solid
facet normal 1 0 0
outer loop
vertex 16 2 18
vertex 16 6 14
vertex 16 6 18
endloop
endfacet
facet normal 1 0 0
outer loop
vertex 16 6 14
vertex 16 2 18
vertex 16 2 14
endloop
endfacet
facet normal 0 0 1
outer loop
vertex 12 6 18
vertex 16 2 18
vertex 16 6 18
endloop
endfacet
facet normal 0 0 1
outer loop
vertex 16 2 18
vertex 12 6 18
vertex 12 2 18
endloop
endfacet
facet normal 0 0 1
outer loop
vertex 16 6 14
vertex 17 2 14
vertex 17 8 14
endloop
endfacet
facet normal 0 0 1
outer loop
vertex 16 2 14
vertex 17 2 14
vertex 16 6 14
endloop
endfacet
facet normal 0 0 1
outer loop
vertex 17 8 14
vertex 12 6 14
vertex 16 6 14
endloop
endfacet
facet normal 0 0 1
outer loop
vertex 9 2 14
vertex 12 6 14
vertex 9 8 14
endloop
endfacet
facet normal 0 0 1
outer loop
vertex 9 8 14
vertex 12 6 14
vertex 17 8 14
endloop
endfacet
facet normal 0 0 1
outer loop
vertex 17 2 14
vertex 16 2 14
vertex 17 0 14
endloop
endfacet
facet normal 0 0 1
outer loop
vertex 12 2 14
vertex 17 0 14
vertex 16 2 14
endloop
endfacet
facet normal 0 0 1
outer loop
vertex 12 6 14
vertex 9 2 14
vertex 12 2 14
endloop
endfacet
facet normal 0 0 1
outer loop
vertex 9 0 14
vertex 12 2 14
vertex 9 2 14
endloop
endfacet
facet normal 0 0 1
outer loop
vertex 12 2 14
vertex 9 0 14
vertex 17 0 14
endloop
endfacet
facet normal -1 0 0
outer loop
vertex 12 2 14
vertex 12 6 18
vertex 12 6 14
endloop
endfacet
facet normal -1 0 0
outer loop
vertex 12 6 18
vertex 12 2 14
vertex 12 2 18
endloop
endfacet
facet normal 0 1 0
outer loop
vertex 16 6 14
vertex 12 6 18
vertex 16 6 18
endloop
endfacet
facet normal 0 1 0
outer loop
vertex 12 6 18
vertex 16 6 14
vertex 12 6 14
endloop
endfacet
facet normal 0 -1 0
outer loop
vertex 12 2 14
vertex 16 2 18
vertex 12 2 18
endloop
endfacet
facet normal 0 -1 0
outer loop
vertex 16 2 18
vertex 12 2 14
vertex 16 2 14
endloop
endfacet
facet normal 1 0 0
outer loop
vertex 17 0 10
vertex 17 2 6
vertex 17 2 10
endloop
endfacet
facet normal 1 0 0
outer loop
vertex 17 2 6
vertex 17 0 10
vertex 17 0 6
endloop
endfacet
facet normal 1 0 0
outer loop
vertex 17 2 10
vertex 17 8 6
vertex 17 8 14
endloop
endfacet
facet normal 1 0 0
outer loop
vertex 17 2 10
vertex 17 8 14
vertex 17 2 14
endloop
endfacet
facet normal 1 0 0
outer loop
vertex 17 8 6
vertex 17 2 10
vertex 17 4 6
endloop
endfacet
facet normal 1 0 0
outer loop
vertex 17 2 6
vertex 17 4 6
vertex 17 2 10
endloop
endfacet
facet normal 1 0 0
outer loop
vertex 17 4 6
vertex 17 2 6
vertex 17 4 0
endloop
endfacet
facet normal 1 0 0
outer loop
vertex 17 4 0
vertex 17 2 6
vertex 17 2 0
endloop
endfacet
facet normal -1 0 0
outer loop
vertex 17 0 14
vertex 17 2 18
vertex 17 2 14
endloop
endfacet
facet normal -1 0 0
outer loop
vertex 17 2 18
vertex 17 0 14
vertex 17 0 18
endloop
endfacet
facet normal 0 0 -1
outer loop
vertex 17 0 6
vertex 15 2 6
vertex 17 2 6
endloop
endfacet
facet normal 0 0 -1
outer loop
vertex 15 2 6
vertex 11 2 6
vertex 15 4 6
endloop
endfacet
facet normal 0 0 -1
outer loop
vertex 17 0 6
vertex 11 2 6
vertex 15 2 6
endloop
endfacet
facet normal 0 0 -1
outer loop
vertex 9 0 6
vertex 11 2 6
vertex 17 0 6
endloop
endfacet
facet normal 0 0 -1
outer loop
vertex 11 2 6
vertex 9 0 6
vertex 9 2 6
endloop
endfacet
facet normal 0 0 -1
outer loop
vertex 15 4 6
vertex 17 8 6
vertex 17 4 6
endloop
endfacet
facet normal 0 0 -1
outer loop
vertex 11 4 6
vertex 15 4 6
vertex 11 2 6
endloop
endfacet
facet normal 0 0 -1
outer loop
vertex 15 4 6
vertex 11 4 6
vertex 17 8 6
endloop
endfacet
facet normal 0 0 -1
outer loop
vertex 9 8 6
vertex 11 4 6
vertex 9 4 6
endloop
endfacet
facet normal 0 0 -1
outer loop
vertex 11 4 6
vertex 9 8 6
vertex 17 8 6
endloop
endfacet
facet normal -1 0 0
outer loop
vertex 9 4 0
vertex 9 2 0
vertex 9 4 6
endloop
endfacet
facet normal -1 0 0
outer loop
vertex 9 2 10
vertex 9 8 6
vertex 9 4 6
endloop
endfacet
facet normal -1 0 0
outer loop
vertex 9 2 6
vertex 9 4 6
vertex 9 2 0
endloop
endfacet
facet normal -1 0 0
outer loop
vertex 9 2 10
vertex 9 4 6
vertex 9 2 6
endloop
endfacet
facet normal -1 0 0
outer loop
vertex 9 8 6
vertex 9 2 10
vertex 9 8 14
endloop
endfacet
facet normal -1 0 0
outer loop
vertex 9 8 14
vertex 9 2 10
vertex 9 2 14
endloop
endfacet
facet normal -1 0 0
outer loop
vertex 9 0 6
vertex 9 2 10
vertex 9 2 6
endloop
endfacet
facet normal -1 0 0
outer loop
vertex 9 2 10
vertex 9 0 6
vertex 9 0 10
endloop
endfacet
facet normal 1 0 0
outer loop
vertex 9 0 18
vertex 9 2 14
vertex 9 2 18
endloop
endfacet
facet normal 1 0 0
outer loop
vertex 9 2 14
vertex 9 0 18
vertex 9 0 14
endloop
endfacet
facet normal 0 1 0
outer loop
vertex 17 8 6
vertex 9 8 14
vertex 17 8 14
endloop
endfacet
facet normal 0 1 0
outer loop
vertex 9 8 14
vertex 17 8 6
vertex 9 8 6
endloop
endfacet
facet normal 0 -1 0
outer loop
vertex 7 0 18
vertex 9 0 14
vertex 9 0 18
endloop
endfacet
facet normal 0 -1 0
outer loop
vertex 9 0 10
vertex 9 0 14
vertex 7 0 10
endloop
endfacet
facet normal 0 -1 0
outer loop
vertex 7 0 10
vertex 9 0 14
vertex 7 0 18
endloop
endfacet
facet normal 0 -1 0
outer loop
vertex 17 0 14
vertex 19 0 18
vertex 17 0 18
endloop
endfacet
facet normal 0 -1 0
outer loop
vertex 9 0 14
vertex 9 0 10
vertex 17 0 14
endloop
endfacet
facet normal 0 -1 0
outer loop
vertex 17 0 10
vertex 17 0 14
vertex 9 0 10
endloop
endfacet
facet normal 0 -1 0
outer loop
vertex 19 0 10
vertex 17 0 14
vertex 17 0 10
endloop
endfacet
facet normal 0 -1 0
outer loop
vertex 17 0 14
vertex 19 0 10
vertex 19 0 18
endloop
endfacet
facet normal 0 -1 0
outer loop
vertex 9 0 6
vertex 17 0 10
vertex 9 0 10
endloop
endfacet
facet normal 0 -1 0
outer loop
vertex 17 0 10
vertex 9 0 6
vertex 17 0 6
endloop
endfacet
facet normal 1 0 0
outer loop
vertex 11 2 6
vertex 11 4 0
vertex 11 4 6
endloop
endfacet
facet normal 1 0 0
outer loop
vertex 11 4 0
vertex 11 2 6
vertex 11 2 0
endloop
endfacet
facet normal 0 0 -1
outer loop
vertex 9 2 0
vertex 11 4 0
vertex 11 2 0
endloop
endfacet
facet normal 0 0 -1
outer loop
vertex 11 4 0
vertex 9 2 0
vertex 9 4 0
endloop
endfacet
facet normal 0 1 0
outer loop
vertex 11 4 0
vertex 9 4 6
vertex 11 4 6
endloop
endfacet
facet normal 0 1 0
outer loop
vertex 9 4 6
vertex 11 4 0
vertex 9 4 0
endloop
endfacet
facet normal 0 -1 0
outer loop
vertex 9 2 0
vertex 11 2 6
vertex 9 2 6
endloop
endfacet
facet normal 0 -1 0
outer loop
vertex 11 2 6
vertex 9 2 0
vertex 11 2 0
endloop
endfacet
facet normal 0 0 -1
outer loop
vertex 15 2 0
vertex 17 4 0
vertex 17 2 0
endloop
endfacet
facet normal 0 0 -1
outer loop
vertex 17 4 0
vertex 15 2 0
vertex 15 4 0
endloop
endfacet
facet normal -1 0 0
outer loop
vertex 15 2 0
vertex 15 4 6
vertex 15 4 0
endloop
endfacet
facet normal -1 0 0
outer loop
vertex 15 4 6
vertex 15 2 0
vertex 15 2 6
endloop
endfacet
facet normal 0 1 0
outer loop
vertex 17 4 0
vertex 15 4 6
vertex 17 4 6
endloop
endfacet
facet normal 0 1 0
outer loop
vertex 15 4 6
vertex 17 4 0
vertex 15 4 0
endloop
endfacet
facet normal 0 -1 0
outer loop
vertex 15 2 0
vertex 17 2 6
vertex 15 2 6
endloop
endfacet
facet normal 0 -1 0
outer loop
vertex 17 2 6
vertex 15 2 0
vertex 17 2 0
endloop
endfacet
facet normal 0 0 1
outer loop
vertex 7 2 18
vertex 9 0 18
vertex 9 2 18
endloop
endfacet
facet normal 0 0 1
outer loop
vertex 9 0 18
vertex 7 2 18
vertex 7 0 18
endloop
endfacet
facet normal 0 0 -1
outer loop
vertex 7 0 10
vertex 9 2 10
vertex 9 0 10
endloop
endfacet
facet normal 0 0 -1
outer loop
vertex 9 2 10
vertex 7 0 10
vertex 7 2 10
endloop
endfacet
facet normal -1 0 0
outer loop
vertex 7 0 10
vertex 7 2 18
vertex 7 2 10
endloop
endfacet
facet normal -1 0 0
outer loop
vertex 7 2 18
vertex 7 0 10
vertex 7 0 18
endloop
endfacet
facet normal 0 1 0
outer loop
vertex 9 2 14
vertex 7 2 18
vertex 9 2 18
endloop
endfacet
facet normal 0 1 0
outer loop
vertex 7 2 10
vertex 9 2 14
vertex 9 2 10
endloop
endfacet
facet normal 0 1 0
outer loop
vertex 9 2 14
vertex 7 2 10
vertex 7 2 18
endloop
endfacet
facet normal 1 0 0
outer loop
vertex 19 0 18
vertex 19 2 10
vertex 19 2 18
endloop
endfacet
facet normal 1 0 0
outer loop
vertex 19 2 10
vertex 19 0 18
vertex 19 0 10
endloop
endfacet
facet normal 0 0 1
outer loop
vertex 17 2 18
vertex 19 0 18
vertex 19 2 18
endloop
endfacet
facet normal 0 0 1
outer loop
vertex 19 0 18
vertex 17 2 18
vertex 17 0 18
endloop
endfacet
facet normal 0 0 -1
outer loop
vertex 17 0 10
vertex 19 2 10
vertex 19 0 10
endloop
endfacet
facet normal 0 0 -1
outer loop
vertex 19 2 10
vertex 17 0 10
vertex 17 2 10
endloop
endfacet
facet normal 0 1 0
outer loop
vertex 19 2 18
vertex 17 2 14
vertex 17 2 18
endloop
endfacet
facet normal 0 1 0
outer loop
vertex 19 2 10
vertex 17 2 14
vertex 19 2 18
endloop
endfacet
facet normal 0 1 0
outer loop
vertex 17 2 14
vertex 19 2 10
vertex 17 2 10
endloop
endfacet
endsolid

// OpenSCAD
// file: ../../../shapes/minecraft/copper-golem/copper-golem.scad
module copperGolem()
{
    // Head
    translate([2, 2, 14])
    {
        color("orange")
        cube([4, 4, 4]);
    }

    // Body
    translate([0, 0, 6])
    {
        color("green")
        cube([8, 8, 8]);
    }

    // Legs
    translate([0, 2, 0])
    {
        color("pink")
        cube([2, 2, 8]);
    }

    translate([6, 2, 0])
    {
        color("pink")
        cube([2, 2, 8]);
    }

    // Arms
    translate([-2, 0, 10])
    {
        color("red")
        cube([2, 2, 8]);
    }

    translate([8, 0, 10])
    {
        color("red")
        cube([2, 2, 8]);
    }

    // Eyes
    translate([2, 2, 8])
    {
        color("white")
        cube([2, 2, 2]);
    }

    translate([4, 2, 8])
    {
        color("white")
        cube([2, 2, 2]);
    }
}
// main file
use <../../../shapes/minecraft/copper-golem/copper-golem.scad>


rotate ([0, 0, $t*360])

translate ([9, 0])

rotate ([0, 0, -$t*360])

// square(5, center=true);
copperGolem();
